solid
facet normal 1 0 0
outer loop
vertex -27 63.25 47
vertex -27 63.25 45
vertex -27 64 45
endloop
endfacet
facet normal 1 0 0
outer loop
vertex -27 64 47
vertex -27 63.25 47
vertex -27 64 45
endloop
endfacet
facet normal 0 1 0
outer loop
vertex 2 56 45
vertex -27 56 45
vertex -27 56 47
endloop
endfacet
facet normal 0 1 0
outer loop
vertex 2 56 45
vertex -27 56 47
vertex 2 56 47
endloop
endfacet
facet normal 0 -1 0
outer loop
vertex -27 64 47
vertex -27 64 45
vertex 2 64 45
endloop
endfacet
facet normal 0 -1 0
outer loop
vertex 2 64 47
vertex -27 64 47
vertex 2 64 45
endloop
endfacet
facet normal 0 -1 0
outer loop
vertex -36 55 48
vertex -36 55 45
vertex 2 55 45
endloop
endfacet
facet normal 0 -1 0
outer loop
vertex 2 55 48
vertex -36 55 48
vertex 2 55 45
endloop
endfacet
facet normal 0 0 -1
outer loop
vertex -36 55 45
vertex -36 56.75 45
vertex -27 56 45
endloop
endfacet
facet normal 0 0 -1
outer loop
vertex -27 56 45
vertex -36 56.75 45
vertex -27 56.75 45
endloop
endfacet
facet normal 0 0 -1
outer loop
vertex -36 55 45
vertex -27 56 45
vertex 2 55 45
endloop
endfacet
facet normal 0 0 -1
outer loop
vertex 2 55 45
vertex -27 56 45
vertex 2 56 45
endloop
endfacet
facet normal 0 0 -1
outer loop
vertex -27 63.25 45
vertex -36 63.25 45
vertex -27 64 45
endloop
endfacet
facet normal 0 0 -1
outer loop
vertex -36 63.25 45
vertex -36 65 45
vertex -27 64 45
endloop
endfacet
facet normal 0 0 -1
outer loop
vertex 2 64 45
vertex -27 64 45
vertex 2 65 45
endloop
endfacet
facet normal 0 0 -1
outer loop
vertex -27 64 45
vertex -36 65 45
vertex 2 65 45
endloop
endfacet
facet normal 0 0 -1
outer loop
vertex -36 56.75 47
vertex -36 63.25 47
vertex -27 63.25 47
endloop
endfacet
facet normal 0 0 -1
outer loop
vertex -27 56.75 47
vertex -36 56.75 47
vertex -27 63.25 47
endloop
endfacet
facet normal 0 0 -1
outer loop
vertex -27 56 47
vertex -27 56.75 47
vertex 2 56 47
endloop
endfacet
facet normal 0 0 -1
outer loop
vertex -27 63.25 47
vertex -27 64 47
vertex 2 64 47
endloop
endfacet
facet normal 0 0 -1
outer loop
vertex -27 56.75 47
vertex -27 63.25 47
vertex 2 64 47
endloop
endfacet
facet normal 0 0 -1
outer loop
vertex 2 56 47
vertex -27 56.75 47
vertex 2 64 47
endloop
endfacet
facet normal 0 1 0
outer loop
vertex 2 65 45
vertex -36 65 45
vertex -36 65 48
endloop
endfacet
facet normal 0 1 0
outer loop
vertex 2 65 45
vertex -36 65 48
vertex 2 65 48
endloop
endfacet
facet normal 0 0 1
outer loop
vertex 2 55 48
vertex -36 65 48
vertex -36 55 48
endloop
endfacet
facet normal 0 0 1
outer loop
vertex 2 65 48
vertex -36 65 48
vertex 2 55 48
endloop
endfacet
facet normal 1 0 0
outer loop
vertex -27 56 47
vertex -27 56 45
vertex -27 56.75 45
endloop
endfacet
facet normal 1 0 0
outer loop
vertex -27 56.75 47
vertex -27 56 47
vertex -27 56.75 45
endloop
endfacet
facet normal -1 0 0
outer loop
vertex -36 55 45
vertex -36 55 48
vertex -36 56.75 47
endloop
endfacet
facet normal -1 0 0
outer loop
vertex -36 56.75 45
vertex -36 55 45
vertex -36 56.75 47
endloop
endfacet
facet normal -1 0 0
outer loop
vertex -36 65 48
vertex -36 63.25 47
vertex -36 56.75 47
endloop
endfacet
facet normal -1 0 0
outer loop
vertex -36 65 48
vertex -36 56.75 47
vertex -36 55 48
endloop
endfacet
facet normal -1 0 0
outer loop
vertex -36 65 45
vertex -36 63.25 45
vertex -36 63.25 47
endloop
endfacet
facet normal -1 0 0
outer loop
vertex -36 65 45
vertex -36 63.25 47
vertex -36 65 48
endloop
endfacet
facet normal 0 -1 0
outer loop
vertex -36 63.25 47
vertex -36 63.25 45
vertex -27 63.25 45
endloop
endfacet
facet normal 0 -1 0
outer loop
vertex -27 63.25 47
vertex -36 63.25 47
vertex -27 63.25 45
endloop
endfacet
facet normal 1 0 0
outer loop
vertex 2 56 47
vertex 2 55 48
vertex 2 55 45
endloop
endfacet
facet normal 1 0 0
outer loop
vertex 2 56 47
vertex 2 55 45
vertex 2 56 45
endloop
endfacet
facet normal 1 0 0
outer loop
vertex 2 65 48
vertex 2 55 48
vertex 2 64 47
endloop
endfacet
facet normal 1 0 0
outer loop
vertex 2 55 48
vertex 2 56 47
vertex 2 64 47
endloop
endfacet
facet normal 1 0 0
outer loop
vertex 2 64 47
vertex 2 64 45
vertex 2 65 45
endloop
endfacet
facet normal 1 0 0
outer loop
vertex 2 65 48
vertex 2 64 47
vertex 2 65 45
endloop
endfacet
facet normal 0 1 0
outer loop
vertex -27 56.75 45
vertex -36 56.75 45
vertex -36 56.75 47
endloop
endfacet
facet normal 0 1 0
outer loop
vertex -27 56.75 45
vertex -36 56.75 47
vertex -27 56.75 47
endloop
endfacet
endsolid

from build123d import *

# Parameters (mm, degrees)
BOX036_W     = 9
BOX036_H     = 1.5
BOX036_DEPTH = 2
BOX037_W     = 9
BOX037_H     = 1.5
BOX037_DEPTH = 2
BOX006_W     = 39
BOX006_H     = 8
BOX006_DEPTH = 2
BOX005_W     = 38
BOX005_H     = 10
BOX005_DEPTH = 3


with BuildPart() as cubo036:
    # Box036 → Box036 (new body)
    with BuildSketch(Plane(origin=(-36, 63.25, 45), x_dir=(1, 0, 0), z_dir=(0, 0, 1))):
        with Locations((4.5, 0.75)):
            Rectangle(BOX036_W, BOX036_H)
    extrude(amount=BOX036_DEPTH)


with BuildPart() as cubo037:
    # Box037 → Box037 (new body)
    with BuildSketch(Plane(origin=(-36, 55.25, 45), x_dir=(1, 0, 0), z_dir=(0, 0, 1))):
        with Locations((4.5, 0.75)):
            Rectangle(BOX037_W, BOX037_H)
    extrude(amount=BOX037_DEPTH)


with BuildPart() as cubo006:
    # Box006 → Box006 (new body)
    with BuildSketch(Plane(origin=(-37, 56, 45), x_dir=(1, 0, 0), z_dir=(0, 0, 1))):
        with Locations((19.5, 4)):
            Rectangle(BOX006_W, BOX006_H)
    extrude(amount=BOX006_DEPTH)


with BuildPart() as fusion002019:
    # Box005 → Box005 (new body)
    with BuildSketch(Plane(origin=(-37, 55, 45), x_dir=(1, 0, 0), z_dir=(0, 0, 1))):
        with Locations((19, 5)):
            Rectangle(BOX005_W, BOX005_H)
    extrude(amount=BOX005_DEPTH)

    # Cut054: cut Cubo006
    add(cubo006.part, mode=Mode.SUBTRACT)


with BuildPart() as fusion002019_1:
    # Cut054 placement: moved
    add(fusion002019.part.moved(Location((1, 0, 0))))

    # Fusion002019: union Cubo036, Cubo037
    add(cubo036.part)
    add(cubo037.part)


solid = fusion002019_1.part
